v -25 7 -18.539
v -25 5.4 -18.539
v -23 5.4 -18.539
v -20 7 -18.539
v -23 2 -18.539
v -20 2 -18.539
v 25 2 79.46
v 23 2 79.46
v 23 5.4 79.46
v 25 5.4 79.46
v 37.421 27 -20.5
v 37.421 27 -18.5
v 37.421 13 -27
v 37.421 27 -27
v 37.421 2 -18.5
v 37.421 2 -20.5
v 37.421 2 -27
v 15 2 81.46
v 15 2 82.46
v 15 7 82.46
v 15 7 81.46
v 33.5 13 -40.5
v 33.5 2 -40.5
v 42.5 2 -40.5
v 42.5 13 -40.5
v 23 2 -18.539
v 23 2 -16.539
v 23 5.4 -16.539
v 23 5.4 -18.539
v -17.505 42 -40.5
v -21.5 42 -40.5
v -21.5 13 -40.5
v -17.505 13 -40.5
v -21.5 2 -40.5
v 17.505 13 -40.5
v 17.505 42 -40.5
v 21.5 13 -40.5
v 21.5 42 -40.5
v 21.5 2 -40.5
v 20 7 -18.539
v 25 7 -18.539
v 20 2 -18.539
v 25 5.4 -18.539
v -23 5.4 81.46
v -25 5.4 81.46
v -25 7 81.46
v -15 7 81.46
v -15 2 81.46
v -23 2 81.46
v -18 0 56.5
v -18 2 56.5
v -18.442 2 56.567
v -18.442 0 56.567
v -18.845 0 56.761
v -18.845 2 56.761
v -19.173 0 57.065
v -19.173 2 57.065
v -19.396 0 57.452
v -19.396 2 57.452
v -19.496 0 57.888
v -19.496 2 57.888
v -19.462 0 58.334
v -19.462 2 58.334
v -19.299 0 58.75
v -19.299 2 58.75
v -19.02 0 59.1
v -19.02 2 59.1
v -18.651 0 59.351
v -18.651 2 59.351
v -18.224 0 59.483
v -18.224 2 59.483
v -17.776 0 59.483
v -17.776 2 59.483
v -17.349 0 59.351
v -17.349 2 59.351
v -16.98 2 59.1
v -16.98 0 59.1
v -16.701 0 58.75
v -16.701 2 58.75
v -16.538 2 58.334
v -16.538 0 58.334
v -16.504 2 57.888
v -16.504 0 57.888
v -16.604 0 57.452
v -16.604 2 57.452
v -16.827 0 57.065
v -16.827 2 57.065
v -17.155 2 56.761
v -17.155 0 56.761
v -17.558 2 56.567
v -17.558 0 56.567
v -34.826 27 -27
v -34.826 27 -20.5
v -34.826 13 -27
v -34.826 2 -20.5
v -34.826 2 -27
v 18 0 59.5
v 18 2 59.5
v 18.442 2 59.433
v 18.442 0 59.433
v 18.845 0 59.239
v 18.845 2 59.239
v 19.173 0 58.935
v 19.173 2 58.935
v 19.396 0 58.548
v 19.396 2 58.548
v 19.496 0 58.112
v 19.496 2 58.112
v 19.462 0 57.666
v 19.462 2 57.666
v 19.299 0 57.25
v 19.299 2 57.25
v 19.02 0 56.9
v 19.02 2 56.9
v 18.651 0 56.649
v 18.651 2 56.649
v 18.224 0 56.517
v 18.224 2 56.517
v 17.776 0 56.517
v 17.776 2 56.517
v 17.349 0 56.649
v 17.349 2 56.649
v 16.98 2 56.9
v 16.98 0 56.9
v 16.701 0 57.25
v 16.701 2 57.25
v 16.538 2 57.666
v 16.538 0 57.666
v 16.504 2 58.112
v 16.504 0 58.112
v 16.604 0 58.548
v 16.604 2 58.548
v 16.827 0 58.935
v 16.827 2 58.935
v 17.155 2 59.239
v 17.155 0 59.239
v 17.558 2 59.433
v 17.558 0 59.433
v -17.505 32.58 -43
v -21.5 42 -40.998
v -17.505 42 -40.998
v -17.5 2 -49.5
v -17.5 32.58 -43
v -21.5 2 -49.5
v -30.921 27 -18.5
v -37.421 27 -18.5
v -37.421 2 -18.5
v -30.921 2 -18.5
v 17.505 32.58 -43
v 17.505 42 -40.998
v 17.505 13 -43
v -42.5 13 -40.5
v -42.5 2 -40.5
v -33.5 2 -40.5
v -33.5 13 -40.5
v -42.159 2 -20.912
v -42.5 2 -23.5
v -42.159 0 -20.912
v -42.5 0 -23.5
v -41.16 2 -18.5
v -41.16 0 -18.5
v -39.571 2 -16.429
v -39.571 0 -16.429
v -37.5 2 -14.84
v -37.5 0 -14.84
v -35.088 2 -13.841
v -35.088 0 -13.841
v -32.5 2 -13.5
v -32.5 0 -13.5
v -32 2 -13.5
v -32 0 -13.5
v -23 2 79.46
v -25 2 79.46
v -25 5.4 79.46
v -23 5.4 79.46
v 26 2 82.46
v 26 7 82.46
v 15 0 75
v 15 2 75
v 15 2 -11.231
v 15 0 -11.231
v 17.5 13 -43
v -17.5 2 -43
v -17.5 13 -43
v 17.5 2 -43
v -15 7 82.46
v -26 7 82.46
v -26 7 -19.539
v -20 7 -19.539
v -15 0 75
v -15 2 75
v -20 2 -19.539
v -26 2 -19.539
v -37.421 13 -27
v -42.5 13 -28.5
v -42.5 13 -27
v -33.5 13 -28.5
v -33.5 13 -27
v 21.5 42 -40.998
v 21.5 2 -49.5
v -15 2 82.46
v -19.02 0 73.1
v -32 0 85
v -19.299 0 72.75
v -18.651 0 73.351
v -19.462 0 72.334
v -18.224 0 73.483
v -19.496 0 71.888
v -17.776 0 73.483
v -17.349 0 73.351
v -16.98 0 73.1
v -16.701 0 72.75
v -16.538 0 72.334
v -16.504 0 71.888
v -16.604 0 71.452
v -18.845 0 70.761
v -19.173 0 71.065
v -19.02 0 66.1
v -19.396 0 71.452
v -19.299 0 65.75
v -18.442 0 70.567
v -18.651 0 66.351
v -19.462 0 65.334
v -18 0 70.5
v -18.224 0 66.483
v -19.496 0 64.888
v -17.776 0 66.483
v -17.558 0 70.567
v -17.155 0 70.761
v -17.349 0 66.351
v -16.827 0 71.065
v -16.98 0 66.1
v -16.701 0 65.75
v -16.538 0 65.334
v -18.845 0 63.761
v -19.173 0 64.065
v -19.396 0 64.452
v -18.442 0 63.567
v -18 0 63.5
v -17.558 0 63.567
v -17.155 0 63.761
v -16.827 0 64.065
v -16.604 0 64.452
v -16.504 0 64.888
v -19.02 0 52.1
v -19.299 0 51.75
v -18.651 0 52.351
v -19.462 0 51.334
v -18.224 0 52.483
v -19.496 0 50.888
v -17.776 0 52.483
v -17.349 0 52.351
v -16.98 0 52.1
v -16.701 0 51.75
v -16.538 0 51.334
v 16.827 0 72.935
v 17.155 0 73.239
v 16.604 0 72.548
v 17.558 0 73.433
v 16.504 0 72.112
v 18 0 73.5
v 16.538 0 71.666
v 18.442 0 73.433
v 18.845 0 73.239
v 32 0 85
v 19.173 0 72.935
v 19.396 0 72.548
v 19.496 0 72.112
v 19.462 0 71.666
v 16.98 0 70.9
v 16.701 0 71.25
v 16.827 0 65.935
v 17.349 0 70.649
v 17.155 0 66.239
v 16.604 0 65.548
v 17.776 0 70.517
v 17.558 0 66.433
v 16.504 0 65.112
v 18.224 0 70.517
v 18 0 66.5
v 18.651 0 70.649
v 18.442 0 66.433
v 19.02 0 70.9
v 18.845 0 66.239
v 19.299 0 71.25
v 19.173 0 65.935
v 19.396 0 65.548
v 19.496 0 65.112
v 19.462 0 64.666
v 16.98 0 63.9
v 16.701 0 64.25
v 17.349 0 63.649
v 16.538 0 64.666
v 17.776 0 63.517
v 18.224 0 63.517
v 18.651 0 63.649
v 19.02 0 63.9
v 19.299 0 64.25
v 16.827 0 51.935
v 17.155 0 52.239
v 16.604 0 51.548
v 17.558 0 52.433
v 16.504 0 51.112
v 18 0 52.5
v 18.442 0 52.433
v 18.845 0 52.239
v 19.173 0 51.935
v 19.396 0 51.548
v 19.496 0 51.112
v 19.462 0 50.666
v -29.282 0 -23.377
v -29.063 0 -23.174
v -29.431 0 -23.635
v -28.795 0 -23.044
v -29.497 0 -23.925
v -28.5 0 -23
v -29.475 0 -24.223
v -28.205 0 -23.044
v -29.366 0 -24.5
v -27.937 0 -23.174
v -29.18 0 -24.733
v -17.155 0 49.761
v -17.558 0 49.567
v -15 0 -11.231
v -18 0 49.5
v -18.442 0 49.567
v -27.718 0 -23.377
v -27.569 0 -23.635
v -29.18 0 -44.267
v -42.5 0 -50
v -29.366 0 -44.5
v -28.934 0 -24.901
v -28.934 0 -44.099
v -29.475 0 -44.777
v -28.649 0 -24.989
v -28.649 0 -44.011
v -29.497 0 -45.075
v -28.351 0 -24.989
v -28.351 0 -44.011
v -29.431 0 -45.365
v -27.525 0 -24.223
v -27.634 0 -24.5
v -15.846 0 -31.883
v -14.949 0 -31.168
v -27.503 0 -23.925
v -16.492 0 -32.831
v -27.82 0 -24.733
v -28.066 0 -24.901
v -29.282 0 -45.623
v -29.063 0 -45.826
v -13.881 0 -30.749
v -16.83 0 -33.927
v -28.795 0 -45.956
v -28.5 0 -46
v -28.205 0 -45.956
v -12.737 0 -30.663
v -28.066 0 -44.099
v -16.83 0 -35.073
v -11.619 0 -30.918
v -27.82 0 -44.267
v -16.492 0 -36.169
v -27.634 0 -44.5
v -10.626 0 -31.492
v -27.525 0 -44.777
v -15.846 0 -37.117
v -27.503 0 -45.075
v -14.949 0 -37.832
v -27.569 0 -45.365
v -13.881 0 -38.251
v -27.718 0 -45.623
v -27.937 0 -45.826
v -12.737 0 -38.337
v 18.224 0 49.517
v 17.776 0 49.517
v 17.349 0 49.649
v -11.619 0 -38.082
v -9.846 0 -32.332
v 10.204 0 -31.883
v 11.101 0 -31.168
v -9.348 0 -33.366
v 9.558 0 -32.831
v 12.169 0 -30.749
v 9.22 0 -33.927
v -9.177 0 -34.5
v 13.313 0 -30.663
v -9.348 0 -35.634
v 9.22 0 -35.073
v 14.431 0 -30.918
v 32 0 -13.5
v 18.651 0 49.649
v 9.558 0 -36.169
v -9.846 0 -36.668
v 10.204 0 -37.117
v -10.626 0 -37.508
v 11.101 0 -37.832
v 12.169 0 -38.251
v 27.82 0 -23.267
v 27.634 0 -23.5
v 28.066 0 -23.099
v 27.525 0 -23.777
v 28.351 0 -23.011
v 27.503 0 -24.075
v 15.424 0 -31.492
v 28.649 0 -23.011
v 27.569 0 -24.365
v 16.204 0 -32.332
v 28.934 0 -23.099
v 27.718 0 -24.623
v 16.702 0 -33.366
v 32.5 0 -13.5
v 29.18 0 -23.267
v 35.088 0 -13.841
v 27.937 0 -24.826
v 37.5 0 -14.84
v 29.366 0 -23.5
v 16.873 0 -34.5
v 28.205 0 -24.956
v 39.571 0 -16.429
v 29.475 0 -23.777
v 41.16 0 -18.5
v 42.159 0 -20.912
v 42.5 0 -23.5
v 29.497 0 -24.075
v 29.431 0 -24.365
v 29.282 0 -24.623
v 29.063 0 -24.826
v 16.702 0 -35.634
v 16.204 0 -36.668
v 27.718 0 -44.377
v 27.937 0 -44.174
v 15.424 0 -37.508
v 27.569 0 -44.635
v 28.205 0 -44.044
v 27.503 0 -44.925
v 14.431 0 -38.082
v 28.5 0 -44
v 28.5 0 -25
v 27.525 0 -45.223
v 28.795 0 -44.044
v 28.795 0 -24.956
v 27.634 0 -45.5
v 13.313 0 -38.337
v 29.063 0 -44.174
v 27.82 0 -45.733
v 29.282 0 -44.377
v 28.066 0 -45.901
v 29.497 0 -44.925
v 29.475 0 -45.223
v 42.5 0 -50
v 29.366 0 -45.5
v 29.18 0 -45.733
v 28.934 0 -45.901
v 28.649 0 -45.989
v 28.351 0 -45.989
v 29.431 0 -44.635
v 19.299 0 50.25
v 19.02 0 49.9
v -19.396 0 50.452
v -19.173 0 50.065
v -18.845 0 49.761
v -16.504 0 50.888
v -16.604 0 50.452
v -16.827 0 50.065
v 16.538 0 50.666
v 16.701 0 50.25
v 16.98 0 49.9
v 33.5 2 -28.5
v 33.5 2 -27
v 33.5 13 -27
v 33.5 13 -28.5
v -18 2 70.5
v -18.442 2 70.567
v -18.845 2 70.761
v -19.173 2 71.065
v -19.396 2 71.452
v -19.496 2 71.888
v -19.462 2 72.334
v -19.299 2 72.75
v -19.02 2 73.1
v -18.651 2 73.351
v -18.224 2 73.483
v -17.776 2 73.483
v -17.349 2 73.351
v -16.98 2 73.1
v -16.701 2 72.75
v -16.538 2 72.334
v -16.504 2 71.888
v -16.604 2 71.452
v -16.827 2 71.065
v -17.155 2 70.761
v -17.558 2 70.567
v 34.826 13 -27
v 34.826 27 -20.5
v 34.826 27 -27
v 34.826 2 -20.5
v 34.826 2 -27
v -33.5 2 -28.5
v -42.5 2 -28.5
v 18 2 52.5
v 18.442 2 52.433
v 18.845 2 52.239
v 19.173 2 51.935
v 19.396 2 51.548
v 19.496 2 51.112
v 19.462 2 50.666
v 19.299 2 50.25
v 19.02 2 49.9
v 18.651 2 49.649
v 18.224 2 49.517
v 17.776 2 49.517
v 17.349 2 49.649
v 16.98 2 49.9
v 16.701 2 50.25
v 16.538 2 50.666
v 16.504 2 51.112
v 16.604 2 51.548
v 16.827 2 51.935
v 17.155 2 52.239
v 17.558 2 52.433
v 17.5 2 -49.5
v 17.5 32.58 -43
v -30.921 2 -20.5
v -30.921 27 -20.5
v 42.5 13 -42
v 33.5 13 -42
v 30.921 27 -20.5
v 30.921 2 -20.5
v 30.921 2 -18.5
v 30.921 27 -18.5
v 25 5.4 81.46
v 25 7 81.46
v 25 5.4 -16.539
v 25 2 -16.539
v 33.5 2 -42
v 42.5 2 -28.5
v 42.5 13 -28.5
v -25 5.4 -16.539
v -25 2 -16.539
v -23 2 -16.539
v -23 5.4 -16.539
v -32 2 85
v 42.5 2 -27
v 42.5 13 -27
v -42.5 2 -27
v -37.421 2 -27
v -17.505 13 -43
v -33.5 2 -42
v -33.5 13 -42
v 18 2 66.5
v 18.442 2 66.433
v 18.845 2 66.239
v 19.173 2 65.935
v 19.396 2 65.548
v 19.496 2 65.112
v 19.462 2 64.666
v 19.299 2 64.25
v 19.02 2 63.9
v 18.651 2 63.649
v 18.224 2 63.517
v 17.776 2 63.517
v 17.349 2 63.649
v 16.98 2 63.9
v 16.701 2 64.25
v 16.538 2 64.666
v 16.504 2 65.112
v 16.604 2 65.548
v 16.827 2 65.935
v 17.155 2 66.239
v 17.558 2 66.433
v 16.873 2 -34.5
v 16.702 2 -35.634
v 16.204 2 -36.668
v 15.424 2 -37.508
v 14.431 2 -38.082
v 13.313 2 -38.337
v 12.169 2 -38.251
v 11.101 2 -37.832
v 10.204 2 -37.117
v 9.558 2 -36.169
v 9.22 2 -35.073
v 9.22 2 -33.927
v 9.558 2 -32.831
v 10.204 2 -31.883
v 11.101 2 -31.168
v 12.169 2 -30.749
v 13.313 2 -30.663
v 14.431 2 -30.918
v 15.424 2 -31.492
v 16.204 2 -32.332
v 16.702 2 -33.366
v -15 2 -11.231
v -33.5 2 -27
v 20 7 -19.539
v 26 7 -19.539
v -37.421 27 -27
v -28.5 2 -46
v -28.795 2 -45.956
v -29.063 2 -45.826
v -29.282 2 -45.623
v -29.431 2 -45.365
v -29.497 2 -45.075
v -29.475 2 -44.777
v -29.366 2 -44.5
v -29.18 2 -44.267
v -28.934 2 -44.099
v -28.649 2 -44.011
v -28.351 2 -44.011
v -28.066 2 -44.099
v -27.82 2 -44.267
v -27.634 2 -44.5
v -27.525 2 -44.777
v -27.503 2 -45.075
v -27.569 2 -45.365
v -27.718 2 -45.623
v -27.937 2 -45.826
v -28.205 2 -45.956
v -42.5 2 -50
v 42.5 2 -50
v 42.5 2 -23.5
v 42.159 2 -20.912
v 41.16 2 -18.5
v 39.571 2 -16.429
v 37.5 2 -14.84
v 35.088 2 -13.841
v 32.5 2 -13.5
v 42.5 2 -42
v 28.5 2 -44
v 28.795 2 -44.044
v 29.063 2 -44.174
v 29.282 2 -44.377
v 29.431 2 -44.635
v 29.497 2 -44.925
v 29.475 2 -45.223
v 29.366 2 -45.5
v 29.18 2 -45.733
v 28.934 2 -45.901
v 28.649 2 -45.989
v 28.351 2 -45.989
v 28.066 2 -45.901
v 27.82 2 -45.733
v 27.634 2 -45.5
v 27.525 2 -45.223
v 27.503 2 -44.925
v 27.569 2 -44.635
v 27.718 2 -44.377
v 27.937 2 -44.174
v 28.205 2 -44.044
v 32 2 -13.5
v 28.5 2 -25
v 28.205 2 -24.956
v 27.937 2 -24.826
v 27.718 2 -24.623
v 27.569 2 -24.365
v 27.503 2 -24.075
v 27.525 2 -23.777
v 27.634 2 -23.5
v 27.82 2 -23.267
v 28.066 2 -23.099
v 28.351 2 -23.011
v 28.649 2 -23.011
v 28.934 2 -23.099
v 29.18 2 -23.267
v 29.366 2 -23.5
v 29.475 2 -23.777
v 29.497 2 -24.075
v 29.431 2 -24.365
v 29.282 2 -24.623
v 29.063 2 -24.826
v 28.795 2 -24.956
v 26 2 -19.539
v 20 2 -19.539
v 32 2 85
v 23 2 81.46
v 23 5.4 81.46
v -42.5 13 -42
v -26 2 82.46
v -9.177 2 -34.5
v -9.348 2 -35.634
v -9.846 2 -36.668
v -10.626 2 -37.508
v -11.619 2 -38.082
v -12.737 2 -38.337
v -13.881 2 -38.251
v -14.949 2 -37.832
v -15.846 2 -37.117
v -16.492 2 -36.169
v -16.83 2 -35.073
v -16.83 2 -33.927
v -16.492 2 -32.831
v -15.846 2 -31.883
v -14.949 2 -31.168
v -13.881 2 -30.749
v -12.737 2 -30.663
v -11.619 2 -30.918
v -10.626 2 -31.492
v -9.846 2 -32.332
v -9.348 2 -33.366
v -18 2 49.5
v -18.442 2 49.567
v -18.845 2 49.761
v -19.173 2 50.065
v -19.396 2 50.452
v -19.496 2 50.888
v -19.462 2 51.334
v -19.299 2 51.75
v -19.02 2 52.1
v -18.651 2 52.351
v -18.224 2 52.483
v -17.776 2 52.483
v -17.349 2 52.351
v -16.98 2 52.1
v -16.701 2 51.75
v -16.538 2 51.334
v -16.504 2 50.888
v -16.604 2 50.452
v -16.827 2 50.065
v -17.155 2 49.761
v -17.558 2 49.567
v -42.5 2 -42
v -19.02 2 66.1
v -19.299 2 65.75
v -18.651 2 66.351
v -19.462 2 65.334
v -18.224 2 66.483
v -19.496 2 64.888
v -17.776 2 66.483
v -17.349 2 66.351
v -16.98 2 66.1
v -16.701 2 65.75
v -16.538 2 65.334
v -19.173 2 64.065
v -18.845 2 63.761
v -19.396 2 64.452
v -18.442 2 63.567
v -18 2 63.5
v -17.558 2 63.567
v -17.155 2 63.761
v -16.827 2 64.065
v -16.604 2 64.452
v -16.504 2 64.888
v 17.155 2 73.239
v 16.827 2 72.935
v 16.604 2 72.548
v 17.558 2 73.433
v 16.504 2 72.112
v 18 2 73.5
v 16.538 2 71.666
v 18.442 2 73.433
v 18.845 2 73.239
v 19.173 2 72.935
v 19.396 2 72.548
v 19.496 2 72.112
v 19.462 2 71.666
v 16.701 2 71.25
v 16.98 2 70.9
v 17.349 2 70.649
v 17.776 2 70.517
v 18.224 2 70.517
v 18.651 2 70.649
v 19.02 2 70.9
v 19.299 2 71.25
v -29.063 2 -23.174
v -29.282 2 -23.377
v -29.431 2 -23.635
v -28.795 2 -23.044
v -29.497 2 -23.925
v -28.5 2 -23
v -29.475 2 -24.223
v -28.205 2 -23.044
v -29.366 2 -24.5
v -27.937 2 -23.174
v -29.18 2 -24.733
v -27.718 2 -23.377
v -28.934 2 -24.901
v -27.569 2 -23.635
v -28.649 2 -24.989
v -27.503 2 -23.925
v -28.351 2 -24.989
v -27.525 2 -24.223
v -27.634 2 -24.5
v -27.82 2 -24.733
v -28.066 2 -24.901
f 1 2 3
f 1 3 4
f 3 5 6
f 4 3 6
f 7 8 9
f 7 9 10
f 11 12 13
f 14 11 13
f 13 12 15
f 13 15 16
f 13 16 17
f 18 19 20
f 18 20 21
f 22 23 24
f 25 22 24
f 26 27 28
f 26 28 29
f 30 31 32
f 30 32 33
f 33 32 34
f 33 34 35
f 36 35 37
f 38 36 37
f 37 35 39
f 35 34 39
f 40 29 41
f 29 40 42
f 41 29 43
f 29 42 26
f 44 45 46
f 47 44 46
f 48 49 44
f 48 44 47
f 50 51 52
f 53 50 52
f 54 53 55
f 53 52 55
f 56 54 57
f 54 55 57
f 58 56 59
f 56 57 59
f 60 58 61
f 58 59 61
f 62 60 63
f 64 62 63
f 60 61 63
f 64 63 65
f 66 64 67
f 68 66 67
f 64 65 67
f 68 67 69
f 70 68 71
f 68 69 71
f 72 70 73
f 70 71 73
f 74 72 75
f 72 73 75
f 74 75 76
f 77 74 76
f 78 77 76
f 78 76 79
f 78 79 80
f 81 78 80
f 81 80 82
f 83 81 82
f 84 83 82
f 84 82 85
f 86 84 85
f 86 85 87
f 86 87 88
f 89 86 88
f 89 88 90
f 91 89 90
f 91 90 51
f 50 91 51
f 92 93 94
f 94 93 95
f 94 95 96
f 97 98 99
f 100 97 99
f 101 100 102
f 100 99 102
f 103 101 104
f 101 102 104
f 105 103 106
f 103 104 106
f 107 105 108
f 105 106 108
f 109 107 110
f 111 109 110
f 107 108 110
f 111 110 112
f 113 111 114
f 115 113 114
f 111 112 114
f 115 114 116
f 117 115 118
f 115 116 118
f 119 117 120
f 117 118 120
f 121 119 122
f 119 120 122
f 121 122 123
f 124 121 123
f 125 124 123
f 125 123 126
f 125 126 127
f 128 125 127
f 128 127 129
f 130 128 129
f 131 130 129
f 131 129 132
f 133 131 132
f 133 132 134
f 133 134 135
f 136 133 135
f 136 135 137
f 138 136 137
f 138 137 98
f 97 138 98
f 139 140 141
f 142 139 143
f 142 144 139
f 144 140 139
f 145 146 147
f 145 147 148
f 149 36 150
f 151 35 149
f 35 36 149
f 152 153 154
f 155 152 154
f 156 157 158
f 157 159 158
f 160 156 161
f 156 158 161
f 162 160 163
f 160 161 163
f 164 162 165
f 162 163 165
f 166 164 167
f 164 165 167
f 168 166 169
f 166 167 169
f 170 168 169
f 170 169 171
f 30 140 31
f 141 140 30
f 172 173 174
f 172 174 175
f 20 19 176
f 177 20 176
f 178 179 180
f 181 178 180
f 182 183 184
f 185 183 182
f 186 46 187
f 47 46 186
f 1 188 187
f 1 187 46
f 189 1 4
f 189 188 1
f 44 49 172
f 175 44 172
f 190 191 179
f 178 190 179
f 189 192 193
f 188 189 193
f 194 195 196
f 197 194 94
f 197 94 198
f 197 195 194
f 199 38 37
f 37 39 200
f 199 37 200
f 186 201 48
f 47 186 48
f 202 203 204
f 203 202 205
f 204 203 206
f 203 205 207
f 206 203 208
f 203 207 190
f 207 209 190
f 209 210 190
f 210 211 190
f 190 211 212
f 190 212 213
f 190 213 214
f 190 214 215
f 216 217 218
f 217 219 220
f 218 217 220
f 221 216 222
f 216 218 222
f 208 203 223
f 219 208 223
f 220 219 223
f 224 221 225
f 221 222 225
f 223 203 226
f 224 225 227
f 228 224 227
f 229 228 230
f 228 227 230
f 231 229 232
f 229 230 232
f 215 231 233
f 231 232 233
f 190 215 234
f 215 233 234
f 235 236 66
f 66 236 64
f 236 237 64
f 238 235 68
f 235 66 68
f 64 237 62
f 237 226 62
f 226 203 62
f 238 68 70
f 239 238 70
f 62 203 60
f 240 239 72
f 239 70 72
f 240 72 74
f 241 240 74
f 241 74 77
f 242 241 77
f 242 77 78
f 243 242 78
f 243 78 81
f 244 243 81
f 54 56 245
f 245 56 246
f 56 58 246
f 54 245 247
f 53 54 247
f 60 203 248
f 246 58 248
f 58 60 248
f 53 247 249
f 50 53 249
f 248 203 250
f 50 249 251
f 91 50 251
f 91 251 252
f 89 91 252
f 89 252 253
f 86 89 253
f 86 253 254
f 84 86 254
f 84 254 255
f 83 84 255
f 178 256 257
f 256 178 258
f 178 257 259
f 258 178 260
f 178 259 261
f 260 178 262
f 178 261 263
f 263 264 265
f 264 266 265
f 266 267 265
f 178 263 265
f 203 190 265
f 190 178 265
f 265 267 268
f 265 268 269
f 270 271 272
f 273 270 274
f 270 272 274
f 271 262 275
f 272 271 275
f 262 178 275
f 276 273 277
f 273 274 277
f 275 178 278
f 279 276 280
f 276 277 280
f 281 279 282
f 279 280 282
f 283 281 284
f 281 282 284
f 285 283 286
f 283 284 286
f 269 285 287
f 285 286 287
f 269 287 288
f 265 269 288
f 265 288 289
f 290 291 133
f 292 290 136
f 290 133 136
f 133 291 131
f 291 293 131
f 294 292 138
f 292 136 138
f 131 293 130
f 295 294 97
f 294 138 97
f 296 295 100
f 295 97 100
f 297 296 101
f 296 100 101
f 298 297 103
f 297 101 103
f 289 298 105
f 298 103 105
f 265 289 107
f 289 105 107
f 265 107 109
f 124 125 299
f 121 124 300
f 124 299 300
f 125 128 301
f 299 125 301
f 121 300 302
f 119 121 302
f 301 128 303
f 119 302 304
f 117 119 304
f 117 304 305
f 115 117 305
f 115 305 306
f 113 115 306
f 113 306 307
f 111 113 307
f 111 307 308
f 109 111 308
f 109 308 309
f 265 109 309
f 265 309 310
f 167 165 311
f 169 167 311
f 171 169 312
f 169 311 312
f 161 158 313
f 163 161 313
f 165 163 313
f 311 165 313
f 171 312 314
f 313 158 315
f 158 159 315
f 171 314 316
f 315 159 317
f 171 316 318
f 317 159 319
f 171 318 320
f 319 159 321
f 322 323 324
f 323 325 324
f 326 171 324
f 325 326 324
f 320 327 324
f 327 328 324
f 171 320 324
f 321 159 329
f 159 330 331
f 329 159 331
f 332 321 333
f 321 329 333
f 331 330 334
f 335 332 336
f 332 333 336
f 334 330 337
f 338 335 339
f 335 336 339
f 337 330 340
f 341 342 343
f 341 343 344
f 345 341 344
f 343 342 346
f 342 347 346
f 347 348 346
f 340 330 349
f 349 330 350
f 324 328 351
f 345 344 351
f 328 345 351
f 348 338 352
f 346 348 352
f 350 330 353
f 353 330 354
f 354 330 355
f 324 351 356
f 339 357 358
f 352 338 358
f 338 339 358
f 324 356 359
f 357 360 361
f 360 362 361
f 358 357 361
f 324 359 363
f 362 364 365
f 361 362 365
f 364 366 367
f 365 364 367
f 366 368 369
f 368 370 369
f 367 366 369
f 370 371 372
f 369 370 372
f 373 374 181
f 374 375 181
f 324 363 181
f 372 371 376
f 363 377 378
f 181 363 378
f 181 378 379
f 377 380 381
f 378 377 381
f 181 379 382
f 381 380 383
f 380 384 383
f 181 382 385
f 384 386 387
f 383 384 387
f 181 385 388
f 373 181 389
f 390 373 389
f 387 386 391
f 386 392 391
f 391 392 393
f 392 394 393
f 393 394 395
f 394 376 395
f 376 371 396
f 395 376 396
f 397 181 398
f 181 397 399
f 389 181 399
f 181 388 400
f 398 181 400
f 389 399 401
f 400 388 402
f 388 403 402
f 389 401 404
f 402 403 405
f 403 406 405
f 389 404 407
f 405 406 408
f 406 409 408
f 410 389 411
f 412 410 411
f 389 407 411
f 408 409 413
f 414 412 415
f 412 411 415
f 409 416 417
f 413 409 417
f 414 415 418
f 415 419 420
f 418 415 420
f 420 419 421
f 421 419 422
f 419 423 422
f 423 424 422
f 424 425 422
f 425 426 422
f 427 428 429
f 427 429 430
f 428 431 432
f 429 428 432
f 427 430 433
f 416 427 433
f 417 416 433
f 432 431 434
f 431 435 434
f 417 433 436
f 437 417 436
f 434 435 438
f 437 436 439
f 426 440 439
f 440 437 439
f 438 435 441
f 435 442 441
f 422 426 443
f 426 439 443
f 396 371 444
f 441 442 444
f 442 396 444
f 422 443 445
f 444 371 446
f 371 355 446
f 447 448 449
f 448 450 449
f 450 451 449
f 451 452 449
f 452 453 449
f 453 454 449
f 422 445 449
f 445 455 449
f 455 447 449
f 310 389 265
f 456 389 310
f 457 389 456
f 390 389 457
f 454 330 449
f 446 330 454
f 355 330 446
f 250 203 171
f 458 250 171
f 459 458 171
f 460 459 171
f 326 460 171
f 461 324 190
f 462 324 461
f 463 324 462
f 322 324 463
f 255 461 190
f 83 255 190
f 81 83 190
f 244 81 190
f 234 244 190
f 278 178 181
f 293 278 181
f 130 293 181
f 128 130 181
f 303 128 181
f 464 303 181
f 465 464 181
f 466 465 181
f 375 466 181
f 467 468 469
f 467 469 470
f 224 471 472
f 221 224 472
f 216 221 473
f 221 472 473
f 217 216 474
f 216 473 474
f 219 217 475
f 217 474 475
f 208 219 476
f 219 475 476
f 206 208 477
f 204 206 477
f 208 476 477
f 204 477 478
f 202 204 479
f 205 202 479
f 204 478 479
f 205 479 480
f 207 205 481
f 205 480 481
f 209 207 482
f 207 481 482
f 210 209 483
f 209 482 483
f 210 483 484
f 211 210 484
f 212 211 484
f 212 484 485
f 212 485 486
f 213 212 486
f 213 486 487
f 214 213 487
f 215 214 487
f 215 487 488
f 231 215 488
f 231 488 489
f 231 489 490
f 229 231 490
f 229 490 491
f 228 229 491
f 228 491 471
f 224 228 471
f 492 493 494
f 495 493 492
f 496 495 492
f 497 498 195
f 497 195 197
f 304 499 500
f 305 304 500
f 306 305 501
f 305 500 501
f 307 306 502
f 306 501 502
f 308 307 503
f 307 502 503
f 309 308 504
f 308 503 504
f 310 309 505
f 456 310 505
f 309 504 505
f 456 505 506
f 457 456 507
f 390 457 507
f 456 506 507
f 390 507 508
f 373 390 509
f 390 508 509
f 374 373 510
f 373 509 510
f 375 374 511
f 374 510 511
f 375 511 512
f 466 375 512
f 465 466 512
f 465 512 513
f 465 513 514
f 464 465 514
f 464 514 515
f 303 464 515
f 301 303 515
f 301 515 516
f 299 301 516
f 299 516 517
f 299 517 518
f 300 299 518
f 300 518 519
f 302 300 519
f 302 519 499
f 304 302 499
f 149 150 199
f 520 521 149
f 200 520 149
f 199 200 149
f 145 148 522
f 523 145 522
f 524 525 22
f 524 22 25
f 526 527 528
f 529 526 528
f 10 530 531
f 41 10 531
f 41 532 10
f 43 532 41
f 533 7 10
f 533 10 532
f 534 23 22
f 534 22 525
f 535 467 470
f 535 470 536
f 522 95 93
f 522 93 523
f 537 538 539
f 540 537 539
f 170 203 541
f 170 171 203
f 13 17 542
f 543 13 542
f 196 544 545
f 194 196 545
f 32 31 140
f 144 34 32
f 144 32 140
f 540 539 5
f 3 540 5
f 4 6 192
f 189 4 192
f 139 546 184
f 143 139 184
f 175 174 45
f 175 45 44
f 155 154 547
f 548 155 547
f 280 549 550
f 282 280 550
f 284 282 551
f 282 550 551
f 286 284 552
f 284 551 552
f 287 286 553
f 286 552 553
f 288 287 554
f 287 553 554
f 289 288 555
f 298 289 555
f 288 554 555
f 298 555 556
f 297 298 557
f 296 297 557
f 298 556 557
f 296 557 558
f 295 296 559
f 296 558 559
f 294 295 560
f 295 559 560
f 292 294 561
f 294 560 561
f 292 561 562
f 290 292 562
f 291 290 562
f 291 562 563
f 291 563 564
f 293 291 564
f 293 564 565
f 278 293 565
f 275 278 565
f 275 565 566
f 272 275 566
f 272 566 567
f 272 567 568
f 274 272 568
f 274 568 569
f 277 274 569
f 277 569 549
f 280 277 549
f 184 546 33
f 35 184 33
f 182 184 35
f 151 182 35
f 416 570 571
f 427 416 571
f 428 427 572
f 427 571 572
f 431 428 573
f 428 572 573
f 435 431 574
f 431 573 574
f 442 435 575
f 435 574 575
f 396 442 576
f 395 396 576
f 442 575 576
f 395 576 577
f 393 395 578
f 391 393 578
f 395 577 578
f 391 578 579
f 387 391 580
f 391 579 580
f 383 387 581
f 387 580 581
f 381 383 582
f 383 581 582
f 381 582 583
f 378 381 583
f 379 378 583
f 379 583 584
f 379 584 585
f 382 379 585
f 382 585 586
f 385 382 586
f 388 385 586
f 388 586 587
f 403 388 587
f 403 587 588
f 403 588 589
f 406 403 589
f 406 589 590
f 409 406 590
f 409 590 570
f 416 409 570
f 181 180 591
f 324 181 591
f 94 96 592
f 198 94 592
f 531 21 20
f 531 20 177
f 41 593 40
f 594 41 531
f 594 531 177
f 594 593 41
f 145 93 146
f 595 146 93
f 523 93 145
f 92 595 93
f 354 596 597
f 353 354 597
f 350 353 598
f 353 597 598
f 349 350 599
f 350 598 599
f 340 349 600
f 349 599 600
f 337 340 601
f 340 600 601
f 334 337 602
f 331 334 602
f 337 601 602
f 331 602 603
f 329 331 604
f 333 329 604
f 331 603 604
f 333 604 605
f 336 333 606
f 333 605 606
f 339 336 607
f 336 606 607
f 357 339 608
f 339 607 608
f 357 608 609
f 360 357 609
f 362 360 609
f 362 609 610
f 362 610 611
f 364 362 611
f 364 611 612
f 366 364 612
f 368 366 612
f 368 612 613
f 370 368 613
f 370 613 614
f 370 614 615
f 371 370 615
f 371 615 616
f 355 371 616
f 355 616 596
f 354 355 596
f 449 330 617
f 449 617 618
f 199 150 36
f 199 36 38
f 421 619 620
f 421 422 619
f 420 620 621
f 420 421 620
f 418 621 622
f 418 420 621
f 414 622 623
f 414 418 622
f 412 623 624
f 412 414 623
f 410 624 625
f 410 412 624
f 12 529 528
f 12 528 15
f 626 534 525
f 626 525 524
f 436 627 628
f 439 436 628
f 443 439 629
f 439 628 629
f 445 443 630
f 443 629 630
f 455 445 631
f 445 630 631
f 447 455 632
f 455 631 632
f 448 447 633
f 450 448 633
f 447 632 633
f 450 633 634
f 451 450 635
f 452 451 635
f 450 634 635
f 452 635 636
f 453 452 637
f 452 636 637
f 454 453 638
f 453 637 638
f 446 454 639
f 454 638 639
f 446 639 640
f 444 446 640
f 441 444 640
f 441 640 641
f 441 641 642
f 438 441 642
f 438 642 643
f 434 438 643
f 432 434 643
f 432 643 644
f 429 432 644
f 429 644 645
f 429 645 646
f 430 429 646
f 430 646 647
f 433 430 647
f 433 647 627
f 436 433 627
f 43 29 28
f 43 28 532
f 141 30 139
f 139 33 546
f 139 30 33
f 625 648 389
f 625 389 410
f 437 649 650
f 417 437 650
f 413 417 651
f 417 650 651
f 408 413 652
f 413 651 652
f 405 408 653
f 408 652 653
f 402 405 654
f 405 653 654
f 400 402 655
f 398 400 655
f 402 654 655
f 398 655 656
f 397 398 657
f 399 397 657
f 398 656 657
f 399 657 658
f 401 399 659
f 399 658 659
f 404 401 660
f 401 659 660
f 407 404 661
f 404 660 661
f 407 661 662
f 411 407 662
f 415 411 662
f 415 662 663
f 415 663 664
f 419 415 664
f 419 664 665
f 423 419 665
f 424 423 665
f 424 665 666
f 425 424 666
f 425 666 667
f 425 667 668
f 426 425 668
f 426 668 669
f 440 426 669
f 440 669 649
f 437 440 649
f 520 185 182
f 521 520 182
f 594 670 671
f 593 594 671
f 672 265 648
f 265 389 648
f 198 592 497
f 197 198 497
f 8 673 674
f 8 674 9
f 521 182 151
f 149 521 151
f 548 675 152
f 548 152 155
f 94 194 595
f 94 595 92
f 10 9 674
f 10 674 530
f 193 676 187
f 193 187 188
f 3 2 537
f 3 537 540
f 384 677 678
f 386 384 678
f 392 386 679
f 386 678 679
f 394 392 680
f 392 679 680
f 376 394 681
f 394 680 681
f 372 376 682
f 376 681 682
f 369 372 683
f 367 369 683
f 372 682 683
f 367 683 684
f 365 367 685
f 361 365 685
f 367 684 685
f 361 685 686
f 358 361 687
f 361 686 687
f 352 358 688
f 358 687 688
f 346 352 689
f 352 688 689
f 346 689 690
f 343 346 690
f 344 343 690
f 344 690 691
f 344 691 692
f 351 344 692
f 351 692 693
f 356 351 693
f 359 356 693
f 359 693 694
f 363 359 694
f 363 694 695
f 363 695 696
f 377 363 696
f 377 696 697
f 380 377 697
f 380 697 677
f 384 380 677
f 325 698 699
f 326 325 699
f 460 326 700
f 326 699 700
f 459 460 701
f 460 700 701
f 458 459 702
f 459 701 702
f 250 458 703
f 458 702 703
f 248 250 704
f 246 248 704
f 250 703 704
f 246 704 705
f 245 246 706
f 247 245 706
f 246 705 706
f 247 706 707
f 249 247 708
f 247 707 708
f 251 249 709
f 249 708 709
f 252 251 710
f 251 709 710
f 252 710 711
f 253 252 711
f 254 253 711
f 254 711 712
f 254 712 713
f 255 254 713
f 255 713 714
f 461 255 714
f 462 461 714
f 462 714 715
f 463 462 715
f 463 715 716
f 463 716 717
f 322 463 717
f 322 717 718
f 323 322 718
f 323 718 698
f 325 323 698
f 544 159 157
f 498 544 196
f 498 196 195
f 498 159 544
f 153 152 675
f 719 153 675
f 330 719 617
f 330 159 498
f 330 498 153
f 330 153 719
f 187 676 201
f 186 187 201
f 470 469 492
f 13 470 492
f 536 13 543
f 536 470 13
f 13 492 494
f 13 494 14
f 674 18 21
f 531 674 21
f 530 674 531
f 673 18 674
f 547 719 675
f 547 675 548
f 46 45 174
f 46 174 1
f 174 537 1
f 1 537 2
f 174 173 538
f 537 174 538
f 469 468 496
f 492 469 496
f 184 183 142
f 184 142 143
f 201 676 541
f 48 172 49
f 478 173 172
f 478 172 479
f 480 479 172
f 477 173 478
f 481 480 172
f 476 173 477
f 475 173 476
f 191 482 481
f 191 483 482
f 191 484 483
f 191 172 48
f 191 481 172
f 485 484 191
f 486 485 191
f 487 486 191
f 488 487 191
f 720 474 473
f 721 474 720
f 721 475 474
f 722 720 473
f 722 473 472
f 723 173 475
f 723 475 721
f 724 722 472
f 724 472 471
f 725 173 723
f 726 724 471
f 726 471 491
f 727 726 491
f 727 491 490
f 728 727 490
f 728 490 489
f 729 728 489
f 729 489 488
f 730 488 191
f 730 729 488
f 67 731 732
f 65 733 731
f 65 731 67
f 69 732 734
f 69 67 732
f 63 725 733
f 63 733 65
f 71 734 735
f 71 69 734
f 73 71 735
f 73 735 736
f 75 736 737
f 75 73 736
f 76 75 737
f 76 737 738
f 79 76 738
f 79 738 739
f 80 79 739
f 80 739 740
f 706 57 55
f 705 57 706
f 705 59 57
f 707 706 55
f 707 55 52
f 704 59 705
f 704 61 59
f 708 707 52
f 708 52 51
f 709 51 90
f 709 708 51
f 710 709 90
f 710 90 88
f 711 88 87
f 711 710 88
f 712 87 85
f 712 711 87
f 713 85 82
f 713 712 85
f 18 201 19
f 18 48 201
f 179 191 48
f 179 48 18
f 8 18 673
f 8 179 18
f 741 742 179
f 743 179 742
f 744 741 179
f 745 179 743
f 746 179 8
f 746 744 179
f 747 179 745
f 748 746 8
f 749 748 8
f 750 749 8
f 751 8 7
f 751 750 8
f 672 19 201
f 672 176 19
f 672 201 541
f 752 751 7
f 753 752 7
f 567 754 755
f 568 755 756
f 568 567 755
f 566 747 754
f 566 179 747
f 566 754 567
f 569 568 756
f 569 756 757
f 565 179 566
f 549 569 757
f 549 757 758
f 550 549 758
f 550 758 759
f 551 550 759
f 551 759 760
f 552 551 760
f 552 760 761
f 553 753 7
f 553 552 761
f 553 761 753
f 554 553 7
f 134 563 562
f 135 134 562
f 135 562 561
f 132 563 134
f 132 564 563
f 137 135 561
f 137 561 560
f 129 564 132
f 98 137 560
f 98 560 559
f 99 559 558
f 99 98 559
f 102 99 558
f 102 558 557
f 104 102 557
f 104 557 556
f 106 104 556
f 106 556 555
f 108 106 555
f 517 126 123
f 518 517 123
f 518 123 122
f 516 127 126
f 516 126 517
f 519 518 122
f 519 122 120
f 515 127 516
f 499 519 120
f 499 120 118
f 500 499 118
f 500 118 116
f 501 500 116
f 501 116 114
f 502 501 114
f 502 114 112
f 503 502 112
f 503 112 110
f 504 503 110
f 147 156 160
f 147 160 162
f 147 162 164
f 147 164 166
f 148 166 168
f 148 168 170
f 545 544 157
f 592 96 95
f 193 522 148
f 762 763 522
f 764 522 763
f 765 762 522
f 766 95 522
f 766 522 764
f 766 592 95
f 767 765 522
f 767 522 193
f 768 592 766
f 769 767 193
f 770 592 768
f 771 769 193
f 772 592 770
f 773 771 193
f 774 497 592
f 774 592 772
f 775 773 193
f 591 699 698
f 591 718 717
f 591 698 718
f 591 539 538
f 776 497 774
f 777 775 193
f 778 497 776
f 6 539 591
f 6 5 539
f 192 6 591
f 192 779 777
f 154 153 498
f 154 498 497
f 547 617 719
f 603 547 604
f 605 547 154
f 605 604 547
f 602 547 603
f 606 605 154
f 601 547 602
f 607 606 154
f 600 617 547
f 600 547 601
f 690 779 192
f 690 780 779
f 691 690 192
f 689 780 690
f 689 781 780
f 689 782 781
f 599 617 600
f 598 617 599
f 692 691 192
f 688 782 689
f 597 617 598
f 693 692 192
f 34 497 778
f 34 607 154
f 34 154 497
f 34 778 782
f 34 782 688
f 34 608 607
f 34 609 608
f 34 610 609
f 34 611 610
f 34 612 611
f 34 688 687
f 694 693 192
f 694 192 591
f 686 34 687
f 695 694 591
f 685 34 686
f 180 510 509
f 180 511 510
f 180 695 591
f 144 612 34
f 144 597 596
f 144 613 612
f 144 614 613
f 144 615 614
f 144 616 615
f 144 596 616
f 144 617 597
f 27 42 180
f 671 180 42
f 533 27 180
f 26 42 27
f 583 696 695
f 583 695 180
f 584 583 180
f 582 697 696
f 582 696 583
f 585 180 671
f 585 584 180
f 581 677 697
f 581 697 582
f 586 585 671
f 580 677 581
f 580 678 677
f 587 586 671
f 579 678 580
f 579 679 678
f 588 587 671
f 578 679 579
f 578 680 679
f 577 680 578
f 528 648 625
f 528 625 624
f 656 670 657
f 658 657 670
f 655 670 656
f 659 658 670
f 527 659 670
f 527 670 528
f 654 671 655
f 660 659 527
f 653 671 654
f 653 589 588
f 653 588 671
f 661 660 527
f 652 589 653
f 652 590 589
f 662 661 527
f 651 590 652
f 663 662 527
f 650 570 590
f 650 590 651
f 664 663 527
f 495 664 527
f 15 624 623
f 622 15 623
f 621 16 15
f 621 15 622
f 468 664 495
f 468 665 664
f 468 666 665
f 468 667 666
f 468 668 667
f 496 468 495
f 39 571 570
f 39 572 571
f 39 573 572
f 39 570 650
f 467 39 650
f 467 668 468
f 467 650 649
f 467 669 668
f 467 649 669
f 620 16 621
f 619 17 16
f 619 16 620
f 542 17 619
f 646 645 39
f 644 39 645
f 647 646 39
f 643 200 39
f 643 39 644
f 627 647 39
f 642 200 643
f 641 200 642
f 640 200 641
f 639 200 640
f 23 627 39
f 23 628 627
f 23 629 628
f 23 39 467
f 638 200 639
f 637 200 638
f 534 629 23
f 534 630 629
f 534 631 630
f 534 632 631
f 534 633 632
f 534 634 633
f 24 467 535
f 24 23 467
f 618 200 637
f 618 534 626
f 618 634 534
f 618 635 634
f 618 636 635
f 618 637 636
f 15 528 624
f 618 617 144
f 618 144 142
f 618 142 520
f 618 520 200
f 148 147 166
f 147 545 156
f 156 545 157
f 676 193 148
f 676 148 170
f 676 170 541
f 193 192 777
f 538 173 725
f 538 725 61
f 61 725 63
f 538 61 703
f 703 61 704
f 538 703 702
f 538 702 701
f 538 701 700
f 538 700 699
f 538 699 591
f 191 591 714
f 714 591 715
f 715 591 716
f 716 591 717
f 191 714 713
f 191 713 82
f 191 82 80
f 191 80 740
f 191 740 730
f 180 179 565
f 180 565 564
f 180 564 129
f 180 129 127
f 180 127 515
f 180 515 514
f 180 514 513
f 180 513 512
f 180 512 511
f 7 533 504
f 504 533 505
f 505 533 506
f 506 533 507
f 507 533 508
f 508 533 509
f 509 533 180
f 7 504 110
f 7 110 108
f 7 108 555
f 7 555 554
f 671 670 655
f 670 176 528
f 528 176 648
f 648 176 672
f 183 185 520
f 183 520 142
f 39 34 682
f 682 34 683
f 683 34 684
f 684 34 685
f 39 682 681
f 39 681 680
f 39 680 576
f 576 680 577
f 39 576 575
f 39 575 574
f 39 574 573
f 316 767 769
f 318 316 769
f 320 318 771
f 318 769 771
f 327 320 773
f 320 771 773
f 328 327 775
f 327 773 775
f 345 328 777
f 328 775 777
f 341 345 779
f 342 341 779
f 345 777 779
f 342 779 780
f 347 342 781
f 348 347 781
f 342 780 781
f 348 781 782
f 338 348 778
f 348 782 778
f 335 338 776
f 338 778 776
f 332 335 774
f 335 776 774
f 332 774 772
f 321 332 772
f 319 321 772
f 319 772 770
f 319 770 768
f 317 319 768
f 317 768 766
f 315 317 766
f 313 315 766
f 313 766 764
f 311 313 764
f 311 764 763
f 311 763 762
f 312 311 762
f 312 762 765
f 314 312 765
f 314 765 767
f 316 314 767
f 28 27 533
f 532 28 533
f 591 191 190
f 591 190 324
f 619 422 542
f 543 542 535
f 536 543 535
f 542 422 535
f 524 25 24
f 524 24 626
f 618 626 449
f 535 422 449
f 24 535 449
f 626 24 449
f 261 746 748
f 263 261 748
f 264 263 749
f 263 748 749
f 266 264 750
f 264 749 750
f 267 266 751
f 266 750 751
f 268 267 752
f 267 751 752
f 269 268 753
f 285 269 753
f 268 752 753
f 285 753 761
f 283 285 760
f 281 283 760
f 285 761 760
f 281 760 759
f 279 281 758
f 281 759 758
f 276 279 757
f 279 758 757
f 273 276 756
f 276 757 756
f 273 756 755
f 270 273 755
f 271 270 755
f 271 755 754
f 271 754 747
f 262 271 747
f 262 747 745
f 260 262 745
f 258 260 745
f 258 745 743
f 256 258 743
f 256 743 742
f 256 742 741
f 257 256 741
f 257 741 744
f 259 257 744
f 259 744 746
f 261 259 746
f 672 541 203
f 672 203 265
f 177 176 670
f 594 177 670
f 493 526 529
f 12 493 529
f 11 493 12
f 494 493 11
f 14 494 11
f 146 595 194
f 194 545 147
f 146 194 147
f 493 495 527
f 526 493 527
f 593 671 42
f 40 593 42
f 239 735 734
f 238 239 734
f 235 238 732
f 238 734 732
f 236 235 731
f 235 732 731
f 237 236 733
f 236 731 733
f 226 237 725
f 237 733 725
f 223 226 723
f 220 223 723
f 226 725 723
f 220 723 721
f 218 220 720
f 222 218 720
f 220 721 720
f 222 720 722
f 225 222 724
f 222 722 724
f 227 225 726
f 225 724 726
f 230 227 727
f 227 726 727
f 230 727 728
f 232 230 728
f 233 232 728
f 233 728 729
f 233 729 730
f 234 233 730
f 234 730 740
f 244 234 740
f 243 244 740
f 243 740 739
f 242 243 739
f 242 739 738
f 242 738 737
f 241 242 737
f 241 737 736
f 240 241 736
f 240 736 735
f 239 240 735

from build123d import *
from OCP.BRepFilletAPI import BRepFilletAPI_MakeChamfer

# Parameters (mm, degrees)
BASE_W               = 85
BASE_H               = 100
BOSS_EXTRUDE2_DEPTH  = 2
SKETCH3_W            = 9
SKETCH3_H            = 1.5
SKETCH3_W_2          = 43
SKETCH3_H_2          = 2.5
BOSS_EXTRUDE4_DEPTH  = 11
SKETCH13_W           = 15
SKETCH13_H           = 61.230763763
SKETCH13_R           = 1
CUT_EXTRUDE2_DEPTH   = 67.537583365
SKETCH14_W           = 2.595547293
SKETCH14_H           = 6.5
SKETCH14_W_2         = 6.5
SKETCH14_H_2         = 2
BOSS_EXTRUDE5_DEPTH  = 25
SKETCH16_W           = 3.995410841
SKETCH16_H           = 2.5
BOSS_EXTRUDE6_DEPTH  = 29
SKETCH18_W           = 4
SKETCH18_H           = 6.5
BOSS_EXTRUDE7_DEPTH  = 40
CHAMFER1_SIZE        = 8.502262467
CHAMFER1_SIZE_2      = 40
SKETCH19_W           = 10.5
SKETCH19_H           = 63.5
CUT_EXTRUDE3_DEPTH   = 77.852130745
BOSS_EXTRUDE8_DEPTH  = 5
FILLET1_R            = 10
SKETCH21_W           = 2
SKETCH21_H           = 2
BOSS_EXTRUDE9_DEPTH  = 3.4
SKETCH22_W           = 64
SKETCH22_H           = 2
BOSS_EXTRUDE10_DEPTH = 35
SKETCH23_R           = 1.5
SKETCH23_W           = 30
SKETCH23_H           = 27.486629776
CUT_EXTRUDE4_DEPTH   = 104.107953137
SKETCH24_W           = 1
SKETCH24_H           = 32.46
SKETCH24_W_2         = 10
SKETCH24_H_2         = 1
BOSS_EXTRUDE11_DEPTH = 5
SKETCH26_W           = 2
SKETCH26_H           = 2
BOSS_EXTRUDE13_DEPTH = 3.4


with BuildPart() as part:
    # base → Boss-Extrude2 (new body)
    with BuildSketch(Plane(origin=(0, 0, 0), x_dir=(1, 0, 0), z_dir=(0, 1, 0))):
        Rectangle(BASE_W, BASE_H)
    extrude(amount=BOSS_EXTRUDE2_DEPTH)

    # Sketch3 → Boss-Extrude4 (add)
    with BuildSketch(Plane(origin=(0, 2, 0), x_dir=(1, 0, 0), z_dir=(0, 1, 0))):
        with Locations((38, 41.25)):
            Rectangle(SKETCH3_W, SKETCH3_H)
        with Locations((38, 27.75)):
            Rectangle(SKETCH3_W, SKETCH3_H)
        with Locations((-38, 41.25)):
            Rectangle(SKETCH3_W, SKETCH3_H)
        with Locations((-38, 27.75)):
            Rectangle(SKETCH3_W, SKETCH3_H)
        with Locations((0, 41.75)):
            Rectangle(SKETCH3_W_2, SKETCH3_H_2)
    extrude(amount=BOSS_EXTRUDE4_DEPTH)

    # Sketch13 → Cut-Extrude2 (cut, through all)
    with BuildSketch(Plane(origin=(0, 2, 0), x_dir=(1, 0, 0), z_dir=(0, 1, 0))):
        with BuildLine():
            ThreePointArc((-16.872793903, 34.5), (-13.024991104, 30.652197201), (-9.177188305, 34.5))
            Line((-9.177188305, 34.5), (-16.872793903, 34.5))
        make_face()
        with BuildLine():
            Line((-16.872793903, 34.5), (-9.177188305, 34.5))
            ThreePointArc((-9.177188305, 34.5), (-13.024991104, 38.347802799), (-16.872793903, 34.5))
        make_face()
        with BuildLine():
            ThreePointArc((9.177188305, 34.5), (13.024991104, 30.652197201), (16.872793903, 34.5))
            Line((16.872793903, 34.5), (9.177188305, 34.5))
        make_face()
        with BuildLine():
            Line((9.177188305, 34.5), (16.872793903, 34.5))
            ThreePointArc((16.872793903, 34.5), (13.024991104, 38.347802799), (9.177188305, 34.5))
        make_face()
        with Locations((-7.5, -19.384618119)):
            Rectangle(SKETCH13_W, SKETCH13_H)
        with Locations((7.5, -19.384618119)):
            Rectangle(SKETCH13_W, SKETCH13_H)
        with Locations(Location((28.5, 45, 0), (0, 0, 270))):
            Circle(SKETCH13_R)
        with Locations(Location((28.5, 24, 0), (0, 0, 90))):
            Circle(SKETCH13_R)
        with Locations(Location((-28.5, 24, 0), (0, 0, 270))):
            Circle(SKETCH13_R)
        with Locations(Location((-28.5, 45, 0), (0, 0, 90))):
            Circle(SKETCH13_R)
    extrude(amount=-CUT_EXTRUDE2_DEPTH, mode=Mode.SUBTRACT)

    # Sketch14 → Boss-Extrude5 (add)
    with BuildSketch(Plane(origin=(0, 2, 0), x_dir=(1, 0, 0), z_dir=(0, 1, 0))):
        with Locations((-36.123593927, 23.75)):
            Rectangle(SKETCH14_W, SKETCH14_H)
        with Locations((-34.171367573, 19.5)):
            Rectangle(SKETCH14_W_2, SKETCH14_H_2)
        with Locations((36.123593927, 23.75)):
            Rectangle(SKETCH14_W, SKETCH14_H)
        Polygon((37.421367573, 20.5), (34.82582028, 20.5), (30.921367573, 20.5), (30.921367573, 18.5), (37.421367573, 18.5), align=None)
    extrude(amount=BOSS_EXTRUDE5_DEPTH)

    # Sketch16 → Boss-Extrude6 (add)
    with BuildSketch(Plane(origin=(0, 13, 0), x_dir=(1, 0, 0), z_dir=(0, 1, 0))):
        with Locations((-19.50229458, 41.75)):
            Rectangle(SKETCH16_W, SKETCH16_H)
        with Locations((19.50229458, 41.75)):
            Rectangle(SKETCH16_W, SKETCH16_H)
    extrude(amount=BOSS_EXTRUDE6_DEPTH)

    # Sketch18 → Boss-Extrude7 (add)
    with BuildSketch(Plane(origin=(0, 2, 0), x_dir=(1, 0, 0), z_dir=(0, 1, 0))):
        with Locations((-19.5, 46.25)):
            Rectangle(SKETCH18_W, SKETCH18_H)
        with Locations((19.5, 46.25)):
            Rectangle(SKETCH18_W, SKETCH18_H)
    extrude(amount=BOSS_EXTRUDE7_DEPTH)

    # Chamfer1
    chamfer1_edges_1 = [part.edges().sort_by_distance(p)[0] for p in [
        (-19.5, 42, -49.5),
    ]]
    chamfer1_side_1 = [part.faces().sort_by_distance(p)[0] for p in [
        (-19.5, 42, -49.329954751),
    ]]
    chamfer1_edges_2 = [part.edges().sort_by_distance(p)[0] for p in [
        (19.5, 42, -49.5),
    ]]
    chamfer1_side_2 = [part.faces().sort_by_distance(p)[0] for p in [
        (19.5, 42, -49.329954751),
    ]]
    chamfer1 = BRepFilletAPI_MakeChamfer(part.part.solid().wrapped)
    for e in chamfer1_edges_1:
        chamfer1.Add(CHAMFER1_SIZE - 0.0001, CHAMFER1_SIZE_2 - 0.0001, e.wrapped, chamfer1_side_1[0].wrapped)
    for e in chamfer1_edges_2:
        chamfer1.Add(CHAMFER1_SIZE - 0.0001, CHAMFER1_SIZE_2 - 0.0001, e.wrapped, chamfer1_side_2[0].wrapped)
    add(Compound.cast(chamfer1.Shape()), mode=Mode.REPLACE)  # a hair under: the kernel refuses the full size

    # Sketch19 → Cut-Extrude3 (cut, through all)
    with BuildSketch(Plane(origin=(0, 2, 0), x_dir=(1, 0, 0), z_dir=(0, 1, 0))):
        with Locations((-37.25, -18.25)):
            Rectangle(SKETCH19_W, SKETCH19_H)
        with Locations((37.25, -18.25)):
            Rectangle(SKETCH19_W, SKETCH19_H)
    extrude(amount=-CUT_EXTRUDE3_DEPTH, mode=Mode.SUBTRACT)

    # Sketch20 → Boss-Extrude8 (add)
    with BuildSketch(Plane(origin=(0, 2, 0), x_dir=(1, 0, 0), z_dir=(0, 1, 0))):
        Polygon((-26, -50), (-25, -50), (-25, 18.538863673), (-20, 18.538863673), (-20, 19.538863673), (-26, 19.538863673), align=None)
        Polygon((20, 18.538863673), (25, 18.538863673), (25, -50), (26, -50), (26, 19.538863673), (20, 19.538863673), align=None)
    extrude(amount=BOSS_EXTRUDE8_DEPTH)

    # Fillet1
    fillet1_edges = [part.edges().sort_by_distance(p)[0] for p in [
        (-42.5, 1, -13.5),
        (42.5, 1, -13.5),
    ]]
    fillet(fillet1_edges, radius=FILLET1_R)

    # Sketch21 → Boss-Extrude9 (add)
    with BuildSketch(Plane(origin=(0, 2, 0), x_dir=(1, 0, 0), z_dir=(0, 1, 0))):
        with Locations((-24, 17.538863673)):
            Rectangle(SKETCH21_W, SKETCH21_H)
        with Locations((24, 17.538863673)):
            Rectangle(SKETCH21_W, SKETCH21_H)
    extrude(amount=BOSS_EXTRUDE9_DEPTH)

    # Sketch22 → Boss-Extrude10 (add)
    with BuildSketch(Plane.XY.offset(50)):
        with Locations((0, 1)):
            Rectangle(SKETCH22_W, SKETCH22_H)
    extrude(amount=BOSS_EXTRUDE10_DEPTH)

    # Sketch23 → Cut-Extrude4 (cut, through all)
    with BuildSketch(Plane(origin=(0, 2, 0), x_dir=(1, 0, 0), z_dir=(0, 1, 0))):
        with Locations(Location((18, -72, 0), (0, 0, 270))):
            Circle(SKETCH23_R)
        with Locations(Location((18, -65, 0), (0, 0, 270))):
            Circle(SKETCH23_R)
        with Locations(Location((18, -58, 0), (0, 0, 270))):
            Circle(SKETCH23_R)
        with Locations(Location((18, -51, 0), (0, 0, 270))):
            Circle(SKETCH23_R)
        with Locations(Location((-18, -51, 0), (0, 0, 90))):
            Circle(SKETCH23_R)
        with Locations(Location((-18, -58, 0), (0, 0, 90))):
            Circle(SKETCH23_R)
        with Locations(Location((-18, -65, 0), (0, 0, 90))):
            Circle(SKETCH23_R)
        with Locations(Location((-18, -72, 0), (0, 0, 90))):
            Circle(SKETCH23_R)
        with Locations((0, -61.256685112)):
            Rectangle(SKETCH23_W, SKETCH23_H)
    extrude(amount=-CUT_EXTRUDE4_DEPTH, mode=Mode.SUBTRACT)

    # Sketch24 → Boss-Extrude11 (add)
    with BuildSketch(Plane(origin=(0, 2, 0), x_dir=(1, 0, 0), z_dir=(0, 1, 0))):
        with Locations((-25.5, -66.23)):
            Rectangle(SKETCH24_W, SKETCH24_H)
        with Locations((-20, -81.96)):
            Rectangle(SKETCH24_W_2, SKETCH24_H_2)
        with Locations((25.5, -66.23)):
            Rectangle(SKETCH24_W, SKETCH24_H)
        with Locations((20, -81.96)):
            Rectangle(SKETCH24_W_2, SKETCH24_H_2)
    extrude(amount=BOSS_EXTRUDE11_DEPTH)

    # Sketch26 → Boss-Extrude13 (add)
    with BuildSketch(Plane(origin=(0, 2, 0), x_dir=(1, 0, 0), z_dir=(0, 1, 0))):
        with Locations((24, -80.46)):
            Rectangle(SKETCH26_W, SKETCH26_H)
        with Locations((-24, -80.46)):
            Rectangle(SKETCH26_W, SKETCH26_H)
    extrude(amount=BOSS_EXTRUDE13_DEPTH)


solid = part.part
